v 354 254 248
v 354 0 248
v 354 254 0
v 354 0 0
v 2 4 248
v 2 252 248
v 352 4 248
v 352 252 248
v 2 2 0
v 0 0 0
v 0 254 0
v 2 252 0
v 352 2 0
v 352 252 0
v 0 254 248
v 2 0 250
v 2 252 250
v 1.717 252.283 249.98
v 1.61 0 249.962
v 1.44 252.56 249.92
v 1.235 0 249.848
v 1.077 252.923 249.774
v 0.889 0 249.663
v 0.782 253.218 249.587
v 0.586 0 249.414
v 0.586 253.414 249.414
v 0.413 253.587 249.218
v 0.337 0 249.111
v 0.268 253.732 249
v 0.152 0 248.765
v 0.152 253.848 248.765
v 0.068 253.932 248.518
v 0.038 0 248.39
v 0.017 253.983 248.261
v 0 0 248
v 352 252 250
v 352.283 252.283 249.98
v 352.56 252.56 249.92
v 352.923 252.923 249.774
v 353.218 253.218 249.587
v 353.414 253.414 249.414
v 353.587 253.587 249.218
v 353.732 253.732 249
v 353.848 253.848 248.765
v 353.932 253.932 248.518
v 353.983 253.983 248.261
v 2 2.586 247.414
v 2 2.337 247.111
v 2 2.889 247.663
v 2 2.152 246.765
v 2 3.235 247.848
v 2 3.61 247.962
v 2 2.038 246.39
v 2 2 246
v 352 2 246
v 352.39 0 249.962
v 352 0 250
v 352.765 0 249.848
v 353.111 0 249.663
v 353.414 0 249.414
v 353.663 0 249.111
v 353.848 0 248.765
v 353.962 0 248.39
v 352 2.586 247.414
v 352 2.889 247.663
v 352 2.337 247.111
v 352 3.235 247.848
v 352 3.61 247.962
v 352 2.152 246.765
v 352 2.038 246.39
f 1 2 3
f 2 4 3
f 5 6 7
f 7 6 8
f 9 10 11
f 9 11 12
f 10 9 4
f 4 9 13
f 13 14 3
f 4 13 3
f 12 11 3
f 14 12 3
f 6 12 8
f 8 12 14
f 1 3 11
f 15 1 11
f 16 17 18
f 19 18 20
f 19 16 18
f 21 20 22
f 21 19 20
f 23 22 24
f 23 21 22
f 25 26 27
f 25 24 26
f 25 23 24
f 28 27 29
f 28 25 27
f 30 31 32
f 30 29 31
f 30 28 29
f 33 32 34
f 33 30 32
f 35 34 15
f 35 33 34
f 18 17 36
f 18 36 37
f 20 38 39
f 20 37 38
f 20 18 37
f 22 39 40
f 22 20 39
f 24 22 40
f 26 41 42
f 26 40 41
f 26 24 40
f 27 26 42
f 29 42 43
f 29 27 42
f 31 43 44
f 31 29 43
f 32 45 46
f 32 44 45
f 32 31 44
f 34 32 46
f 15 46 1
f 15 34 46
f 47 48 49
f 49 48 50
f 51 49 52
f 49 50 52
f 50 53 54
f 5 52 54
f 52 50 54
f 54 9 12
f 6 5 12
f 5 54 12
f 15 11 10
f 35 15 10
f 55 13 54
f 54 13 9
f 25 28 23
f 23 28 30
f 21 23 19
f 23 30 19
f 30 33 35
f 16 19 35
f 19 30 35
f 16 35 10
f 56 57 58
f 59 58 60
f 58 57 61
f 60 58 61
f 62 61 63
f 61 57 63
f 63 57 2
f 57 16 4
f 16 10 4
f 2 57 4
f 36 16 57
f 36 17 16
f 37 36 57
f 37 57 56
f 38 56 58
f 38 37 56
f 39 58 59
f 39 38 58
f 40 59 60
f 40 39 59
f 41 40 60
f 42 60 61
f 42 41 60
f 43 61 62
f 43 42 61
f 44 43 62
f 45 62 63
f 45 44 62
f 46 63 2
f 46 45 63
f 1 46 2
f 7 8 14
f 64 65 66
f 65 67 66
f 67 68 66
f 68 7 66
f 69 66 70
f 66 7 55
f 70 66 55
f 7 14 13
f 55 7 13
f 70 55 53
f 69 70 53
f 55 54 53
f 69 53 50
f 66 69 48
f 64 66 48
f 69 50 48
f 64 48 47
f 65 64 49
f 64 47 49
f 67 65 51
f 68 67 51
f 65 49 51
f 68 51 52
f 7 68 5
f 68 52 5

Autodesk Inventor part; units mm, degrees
ref_plane "YZ Plane" through (0, 0, 0) normal (1, 0, 0) x (0, 1, 0)
ref_plane "XZ Plane" through (0, 0, 0) normal (0, 1, 0) x (-1, 0, 0)
ref_plane "XY Plane" through (0, 0, 0) normal (0, 0, 1) x (1, 0, 0)
sketch "Esboço11" plane through (0, 0, 0) normal (0, 0, 1) x (1, 0, 0)
  line L0 (0, 0) -> (354, 0)
  line L1 (354, 0) -> (354, 254)
  line L2 (354, 254) -> (0, 254)
  line L3 (0, 254) -> (0, 0)
  line L4 (2, 252) -> (352, 252)
  line L5 (352, 252) -> (352, 2)
  line L6 (352, 2) -> (2, 2)
  line L7 (2, 2) -> (2, 252)
  dimension "d14" = 354
  dimension "d15" = 254
  dimension "d16" = 2
  dimension "d17" = 2
  dimension "d18" = 2
  dimension "d19" = 2
extrude "Extrusão3" add sketch "Esboço11" along normal blind 250
sketch "Esboço12" plane through (0, 0, 250) normal (0, 0, 1) x (1, 0, 0)
  line L0 (2, 2) -> (2, 252) projected
  line L1 (352, 2) -> (2, 2) projected
  line L2 (2, 252) -> (352, 252)
  line L3 (352, 252) -> (352, 2)
  line L4 (352, 2) -> (2, 2)
  line L5 (2, 2) -> (2, 252)
  point P0 (0, 0)
extrude "Extrusão4" add sketch "Esboço12" against normal blind 2
fillet "Arredondamento1" radius 2 4 edges at (177, 254, 250) (177, 2, 248) (354, 127, 250) (0, 127, 250)
properties part number "Caixa"
